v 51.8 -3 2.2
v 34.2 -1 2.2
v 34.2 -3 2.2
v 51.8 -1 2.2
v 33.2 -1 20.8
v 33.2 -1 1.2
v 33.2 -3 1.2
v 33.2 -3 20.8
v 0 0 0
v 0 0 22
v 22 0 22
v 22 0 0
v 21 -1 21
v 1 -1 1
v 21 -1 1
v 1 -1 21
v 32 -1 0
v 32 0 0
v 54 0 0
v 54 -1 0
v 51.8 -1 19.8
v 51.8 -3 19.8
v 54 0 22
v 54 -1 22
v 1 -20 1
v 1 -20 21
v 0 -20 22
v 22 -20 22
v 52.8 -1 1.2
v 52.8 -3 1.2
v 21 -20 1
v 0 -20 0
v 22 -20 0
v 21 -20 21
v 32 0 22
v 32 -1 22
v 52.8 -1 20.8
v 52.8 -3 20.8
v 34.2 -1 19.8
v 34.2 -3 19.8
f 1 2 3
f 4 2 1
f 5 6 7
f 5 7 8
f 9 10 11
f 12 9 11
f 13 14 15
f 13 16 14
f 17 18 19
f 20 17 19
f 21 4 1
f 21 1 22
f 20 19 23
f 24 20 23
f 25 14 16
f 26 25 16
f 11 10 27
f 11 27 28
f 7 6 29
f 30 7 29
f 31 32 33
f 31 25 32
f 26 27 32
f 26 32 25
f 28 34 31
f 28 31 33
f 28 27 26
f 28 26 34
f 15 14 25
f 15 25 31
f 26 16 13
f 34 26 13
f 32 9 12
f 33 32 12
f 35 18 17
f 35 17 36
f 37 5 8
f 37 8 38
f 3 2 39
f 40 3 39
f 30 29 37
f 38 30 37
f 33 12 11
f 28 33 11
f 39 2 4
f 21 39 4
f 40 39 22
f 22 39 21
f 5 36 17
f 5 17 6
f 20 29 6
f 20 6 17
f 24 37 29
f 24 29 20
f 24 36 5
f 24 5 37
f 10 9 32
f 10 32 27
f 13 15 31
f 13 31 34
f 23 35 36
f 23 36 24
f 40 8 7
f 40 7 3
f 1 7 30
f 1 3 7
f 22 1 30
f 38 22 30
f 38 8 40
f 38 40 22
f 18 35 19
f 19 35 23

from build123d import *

# Parameters (mm, degrees)
F0_W     = 22
F0_H     = 22
F0_W_2   = 20
F0_H_2   = 20
F1_DEPTH = 1
F0_W_3   = 19.6
F0_H_3   = 19.6
F0_W_4   = 17.6
F0_H_4   = 17.6
F2_DEPTH = 20
F3_DEPTH = 3


with BuildPart() as f1:
    # F0 (on Front) → F1 (new body)
    with BuildSketch(Plane.XZ):
        with Locations((11, 11)):
            Rectangle(F0_W, F0_H)
        with Locations((11, 11)):
            Rectangle(F0_W_2, F0_H_2, mode=Mode.SUBTRACT)
        with Locations((11, 11)):
            Rectangle(F0_W_2, F0_H_2)
    extrude(amount=F1_DEPTH)

    # F0 (on Front) → F2 (join)
    with BuildSketch(Plane.XZ):
        with Locations((11, 11)):
            Rectangle(F0_W, F0_H)
        with Locations((11, 11)):
            Rectangle(F0_W_2, F0_H_2, mode=Mode.SUBTRACT)
    extrude(amount=F2_DEPTH)


with BuildPart() as f1b:
    # F0 (on Front) → F1, piece 2 (new body)
    with BuildSketch(Plane.XZ):
        with Locations((43, 11)):
            Rectangle(F0_W, F0_H)
        with Locations((43, 11)):
            Rectangle(F0_W_3, F0_H_3, mode=Mode.SUBTRACT)
        with Locations((43, 11)):
            Rectangle(F0_W_3, F0_H_3)
        with Locations((43, 11)):
            Rectangle(F0_W_4, F0_H_4, mode=Mode.SUBTRACT)
        with Locations((43, 11)):
            Rectangle(F0_W_4, F0_H_4)
    extrude(amount=F1_DEPTH)

    # F0 (on Front) → F3 (join)
    with BuildSketch(Plane.XZ):
        with Locations((43, 11)):
            Rectangle(F0_W_3, F0_H_3)
        with Locations((43, 11)):
            Rectangle(F0_W_4, F0_H_4, mode=Mode.SUBTRACT)
    extrude(amount=F3_DEPTH)


solid = Compound([f1.part, f1b.part])
